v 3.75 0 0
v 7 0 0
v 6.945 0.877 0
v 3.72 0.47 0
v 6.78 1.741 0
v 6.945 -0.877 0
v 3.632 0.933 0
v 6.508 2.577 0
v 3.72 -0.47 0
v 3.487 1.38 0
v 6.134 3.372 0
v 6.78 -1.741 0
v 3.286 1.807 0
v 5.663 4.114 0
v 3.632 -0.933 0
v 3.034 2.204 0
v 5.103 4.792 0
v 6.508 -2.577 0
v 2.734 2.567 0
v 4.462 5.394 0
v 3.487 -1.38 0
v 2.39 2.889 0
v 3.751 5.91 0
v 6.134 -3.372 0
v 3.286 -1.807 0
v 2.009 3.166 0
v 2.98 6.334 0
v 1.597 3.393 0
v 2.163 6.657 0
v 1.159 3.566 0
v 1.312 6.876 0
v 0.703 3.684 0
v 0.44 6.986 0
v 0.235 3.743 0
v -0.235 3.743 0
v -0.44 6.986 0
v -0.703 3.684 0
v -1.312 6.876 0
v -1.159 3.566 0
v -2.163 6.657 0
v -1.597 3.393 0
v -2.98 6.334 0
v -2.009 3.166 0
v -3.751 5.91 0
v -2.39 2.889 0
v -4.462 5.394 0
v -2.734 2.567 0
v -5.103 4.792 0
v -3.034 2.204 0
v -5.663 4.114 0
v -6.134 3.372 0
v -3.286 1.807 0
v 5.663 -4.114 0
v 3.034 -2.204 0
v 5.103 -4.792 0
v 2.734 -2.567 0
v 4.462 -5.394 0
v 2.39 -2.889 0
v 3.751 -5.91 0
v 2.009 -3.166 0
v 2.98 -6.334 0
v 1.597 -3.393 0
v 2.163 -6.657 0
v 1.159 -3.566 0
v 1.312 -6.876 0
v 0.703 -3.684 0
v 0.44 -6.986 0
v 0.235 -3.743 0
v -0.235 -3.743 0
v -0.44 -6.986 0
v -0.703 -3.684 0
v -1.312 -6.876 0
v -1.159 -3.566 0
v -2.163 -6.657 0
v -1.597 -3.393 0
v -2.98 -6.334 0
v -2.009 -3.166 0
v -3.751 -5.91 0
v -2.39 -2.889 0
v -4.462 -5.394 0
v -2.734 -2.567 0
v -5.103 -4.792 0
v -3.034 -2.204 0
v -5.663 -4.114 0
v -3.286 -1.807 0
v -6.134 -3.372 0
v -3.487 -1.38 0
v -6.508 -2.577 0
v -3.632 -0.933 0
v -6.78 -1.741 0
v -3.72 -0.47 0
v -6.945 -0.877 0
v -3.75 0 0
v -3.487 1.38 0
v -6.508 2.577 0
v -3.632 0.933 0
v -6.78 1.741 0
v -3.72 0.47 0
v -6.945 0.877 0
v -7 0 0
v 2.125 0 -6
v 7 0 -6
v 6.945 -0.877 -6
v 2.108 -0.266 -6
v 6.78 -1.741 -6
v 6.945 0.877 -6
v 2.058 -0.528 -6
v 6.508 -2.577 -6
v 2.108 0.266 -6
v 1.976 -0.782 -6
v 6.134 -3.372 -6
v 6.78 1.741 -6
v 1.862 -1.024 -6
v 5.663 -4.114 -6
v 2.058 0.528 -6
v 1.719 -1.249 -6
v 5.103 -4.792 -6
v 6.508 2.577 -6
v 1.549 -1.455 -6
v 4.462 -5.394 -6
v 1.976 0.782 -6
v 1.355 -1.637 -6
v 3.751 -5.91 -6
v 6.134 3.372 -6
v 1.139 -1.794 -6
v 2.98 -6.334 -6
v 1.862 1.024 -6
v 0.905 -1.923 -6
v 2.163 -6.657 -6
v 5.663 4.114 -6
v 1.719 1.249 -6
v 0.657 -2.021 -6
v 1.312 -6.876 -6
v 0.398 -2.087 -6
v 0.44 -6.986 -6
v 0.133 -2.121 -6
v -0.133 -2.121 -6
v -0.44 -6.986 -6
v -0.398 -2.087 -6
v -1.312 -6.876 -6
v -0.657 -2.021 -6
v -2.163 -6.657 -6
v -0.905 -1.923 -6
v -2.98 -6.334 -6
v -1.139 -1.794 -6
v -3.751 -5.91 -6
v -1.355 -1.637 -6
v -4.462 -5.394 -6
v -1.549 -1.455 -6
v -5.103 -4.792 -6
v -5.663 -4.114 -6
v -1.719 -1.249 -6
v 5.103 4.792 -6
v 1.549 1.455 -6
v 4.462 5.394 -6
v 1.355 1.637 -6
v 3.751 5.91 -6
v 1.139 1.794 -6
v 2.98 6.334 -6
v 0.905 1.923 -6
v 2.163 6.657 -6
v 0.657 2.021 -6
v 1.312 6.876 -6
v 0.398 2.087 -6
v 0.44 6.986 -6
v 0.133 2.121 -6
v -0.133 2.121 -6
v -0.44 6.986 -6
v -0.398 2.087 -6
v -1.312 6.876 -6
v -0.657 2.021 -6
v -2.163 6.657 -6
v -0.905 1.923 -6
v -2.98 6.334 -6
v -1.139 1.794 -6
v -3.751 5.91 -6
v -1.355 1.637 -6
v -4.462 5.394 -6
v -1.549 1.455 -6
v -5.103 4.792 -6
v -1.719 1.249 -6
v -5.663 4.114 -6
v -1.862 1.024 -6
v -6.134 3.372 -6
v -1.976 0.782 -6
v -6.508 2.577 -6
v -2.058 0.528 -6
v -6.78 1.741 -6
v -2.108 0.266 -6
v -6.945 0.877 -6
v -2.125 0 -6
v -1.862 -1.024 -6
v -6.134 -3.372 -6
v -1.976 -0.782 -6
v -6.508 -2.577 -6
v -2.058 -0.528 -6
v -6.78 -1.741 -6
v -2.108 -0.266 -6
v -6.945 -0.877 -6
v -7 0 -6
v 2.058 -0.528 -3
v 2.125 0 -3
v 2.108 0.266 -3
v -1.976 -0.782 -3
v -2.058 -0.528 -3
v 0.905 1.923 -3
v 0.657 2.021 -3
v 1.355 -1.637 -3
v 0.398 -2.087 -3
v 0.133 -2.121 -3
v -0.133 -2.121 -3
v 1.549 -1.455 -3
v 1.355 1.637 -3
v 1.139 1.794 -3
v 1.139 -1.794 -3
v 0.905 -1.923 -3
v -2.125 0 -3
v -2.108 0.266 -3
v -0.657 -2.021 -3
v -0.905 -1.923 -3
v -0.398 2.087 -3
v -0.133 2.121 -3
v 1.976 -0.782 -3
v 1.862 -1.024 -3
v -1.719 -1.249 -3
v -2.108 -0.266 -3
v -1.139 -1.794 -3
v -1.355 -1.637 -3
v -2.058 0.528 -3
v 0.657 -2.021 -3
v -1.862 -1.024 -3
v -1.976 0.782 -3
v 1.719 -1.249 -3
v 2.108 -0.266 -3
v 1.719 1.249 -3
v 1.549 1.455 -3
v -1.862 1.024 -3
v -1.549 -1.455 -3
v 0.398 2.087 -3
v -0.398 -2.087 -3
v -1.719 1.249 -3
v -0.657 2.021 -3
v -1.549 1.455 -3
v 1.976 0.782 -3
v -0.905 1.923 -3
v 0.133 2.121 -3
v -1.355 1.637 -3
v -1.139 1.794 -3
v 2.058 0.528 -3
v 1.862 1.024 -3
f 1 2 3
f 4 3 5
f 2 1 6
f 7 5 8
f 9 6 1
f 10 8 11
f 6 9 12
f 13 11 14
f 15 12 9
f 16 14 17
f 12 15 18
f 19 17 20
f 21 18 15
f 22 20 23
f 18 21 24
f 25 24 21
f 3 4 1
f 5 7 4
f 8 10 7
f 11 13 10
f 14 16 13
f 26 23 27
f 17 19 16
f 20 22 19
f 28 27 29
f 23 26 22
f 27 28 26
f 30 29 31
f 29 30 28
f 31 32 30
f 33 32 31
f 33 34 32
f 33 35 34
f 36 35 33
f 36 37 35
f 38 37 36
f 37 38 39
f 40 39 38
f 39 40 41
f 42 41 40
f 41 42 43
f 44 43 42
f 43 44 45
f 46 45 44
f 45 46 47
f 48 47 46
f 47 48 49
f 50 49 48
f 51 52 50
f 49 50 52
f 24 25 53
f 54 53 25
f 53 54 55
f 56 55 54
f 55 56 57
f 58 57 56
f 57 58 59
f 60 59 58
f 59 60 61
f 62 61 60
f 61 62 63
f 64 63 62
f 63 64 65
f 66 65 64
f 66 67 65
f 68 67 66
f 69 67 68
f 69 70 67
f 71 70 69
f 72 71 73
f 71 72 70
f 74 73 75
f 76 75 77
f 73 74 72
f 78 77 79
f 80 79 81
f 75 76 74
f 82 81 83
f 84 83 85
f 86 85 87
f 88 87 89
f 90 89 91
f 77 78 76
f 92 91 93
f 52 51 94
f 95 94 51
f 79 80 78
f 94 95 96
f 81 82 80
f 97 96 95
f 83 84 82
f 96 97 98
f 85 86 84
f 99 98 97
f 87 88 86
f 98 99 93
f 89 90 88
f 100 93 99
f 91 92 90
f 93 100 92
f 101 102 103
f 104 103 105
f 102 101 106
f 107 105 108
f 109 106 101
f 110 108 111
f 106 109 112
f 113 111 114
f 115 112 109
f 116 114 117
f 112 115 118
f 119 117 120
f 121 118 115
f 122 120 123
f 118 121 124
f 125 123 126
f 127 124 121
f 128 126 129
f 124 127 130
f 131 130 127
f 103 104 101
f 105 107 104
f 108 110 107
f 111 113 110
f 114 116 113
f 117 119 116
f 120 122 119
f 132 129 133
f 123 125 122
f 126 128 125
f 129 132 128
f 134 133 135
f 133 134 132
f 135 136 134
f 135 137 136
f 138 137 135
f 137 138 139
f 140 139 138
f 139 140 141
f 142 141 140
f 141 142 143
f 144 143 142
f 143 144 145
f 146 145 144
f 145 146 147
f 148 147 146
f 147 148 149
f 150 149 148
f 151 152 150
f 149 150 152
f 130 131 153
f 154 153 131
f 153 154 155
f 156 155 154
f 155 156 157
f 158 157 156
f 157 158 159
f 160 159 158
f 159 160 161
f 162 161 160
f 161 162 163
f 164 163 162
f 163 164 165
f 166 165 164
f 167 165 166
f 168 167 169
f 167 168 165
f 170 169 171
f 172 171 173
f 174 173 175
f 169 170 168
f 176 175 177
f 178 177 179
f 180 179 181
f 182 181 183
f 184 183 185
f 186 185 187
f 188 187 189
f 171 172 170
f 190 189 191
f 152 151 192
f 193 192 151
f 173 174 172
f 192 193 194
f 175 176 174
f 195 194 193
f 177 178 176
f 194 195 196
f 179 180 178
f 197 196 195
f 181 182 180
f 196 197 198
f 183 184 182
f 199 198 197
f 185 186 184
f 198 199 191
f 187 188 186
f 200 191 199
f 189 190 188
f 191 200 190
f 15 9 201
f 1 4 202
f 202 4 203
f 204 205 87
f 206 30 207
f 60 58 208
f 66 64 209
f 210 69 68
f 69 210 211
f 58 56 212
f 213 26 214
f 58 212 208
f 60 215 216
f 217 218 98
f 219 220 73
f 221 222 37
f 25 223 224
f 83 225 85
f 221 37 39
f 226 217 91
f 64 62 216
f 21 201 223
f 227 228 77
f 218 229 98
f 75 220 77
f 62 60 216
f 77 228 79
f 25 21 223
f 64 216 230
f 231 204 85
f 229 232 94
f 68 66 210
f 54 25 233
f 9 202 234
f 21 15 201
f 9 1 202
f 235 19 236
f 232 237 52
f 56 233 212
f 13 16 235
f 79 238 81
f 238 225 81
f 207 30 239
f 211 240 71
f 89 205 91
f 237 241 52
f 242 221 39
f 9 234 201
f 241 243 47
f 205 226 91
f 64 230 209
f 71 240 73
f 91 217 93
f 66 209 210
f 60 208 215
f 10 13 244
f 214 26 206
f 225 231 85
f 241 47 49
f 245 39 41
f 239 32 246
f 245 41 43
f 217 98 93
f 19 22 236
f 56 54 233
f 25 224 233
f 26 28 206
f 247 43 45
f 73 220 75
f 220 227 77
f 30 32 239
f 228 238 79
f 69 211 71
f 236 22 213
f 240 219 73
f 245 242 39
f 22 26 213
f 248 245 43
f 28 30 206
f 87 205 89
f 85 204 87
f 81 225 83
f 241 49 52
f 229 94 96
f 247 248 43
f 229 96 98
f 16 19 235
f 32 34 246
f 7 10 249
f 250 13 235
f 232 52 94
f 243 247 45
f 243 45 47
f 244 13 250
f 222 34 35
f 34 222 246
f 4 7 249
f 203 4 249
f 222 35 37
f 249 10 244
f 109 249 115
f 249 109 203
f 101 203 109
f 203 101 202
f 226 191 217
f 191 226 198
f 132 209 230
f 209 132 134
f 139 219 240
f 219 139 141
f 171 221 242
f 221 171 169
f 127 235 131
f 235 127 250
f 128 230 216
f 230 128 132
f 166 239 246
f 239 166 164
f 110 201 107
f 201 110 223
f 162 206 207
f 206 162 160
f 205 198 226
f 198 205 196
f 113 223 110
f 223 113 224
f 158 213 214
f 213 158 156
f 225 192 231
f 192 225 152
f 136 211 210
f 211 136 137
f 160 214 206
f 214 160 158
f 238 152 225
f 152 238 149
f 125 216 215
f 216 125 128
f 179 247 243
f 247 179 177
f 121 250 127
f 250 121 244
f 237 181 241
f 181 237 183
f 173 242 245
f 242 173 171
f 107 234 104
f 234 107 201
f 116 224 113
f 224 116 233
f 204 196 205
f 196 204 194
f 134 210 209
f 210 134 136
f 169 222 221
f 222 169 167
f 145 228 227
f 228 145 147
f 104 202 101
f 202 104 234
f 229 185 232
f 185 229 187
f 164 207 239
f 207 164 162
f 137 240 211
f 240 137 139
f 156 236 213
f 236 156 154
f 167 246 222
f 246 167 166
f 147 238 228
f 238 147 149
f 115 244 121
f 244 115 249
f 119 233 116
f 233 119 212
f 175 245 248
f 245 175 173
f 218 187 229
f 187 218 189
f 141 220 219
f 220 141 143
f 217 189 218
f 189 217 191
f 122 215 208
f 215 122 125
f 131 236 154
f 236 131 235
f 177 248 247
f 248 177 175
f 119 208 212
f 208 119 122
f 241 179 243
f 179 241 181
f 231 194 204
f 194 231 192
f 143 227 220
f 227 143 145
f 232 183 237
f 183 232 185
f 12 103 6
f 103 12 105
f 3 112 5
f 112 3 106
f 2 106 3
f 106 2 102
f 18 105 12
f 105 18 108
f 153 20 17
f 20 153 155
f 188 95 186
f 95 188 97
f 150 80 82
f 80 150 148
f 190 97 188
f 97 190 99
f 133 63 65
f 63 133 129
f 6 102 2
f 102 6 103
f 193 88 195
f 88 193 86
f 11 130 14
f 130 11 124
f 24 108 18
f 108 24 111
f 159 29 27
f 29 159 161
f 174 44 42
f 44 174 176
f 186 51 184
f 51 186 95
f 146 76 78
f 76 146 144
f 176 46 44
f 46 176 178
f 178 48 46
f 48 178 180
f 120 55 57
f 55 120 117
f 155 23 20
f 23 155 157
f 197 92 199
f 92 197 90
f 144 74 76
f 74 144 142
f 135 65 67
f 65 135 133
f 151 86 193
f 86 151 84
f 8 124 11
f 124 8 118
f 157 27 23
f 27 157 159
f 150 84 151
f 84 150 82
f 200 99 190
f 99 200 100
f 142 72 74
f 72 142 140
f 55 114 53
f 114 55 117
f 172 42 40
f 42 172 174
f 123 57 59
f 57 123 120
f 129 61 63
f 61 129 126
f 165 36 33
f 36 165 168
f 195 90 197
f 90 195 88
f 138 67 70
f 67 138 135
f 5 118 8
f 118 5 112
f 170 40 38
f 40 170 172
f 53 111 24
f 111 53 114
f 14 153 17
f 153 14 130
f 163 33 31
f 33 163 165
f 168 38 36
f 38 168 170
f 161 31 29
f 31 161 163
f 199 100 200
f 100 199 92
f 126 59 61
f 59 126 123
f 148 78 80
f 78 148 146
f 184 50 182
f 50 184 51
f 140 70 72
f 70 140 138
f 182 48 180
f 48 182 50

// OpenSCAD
$fn = 50;


difference() {
	union() {
		translate(v = [0, 0, -6.0000000000]) {
			cylinder(h = 6, r = 7.0000000000);
		}
		cylinder(h = 0, r = 17.0000000000);
	}
	union() {
		translate(v = [0, 0, 0]) {
			rotate(a = [0, 0, 0]) {
				difference() {
					union() {
						#translate(v = [0, 0, -6.0000000000]) {
							cylinder(h = 6, r = 2.0000000000);
						}
						#translate(v = [0, 0, -3]) {
							cylinder(h = 3, r = 7.0000000000, r1 = 2.1250000000, r2 = 3.7500000000);
						}
						#translate(v = [0, 0, -6.0000000000]) {
							cylinder(h = 6, r = 2.1250000000);
						}
						#translate(v = [0, 0, -6.0000000000]) {
							cylinder(h = 6, r = 2.0000000000);
						}
					}
					union();
				}
			}
		}
	}
}
